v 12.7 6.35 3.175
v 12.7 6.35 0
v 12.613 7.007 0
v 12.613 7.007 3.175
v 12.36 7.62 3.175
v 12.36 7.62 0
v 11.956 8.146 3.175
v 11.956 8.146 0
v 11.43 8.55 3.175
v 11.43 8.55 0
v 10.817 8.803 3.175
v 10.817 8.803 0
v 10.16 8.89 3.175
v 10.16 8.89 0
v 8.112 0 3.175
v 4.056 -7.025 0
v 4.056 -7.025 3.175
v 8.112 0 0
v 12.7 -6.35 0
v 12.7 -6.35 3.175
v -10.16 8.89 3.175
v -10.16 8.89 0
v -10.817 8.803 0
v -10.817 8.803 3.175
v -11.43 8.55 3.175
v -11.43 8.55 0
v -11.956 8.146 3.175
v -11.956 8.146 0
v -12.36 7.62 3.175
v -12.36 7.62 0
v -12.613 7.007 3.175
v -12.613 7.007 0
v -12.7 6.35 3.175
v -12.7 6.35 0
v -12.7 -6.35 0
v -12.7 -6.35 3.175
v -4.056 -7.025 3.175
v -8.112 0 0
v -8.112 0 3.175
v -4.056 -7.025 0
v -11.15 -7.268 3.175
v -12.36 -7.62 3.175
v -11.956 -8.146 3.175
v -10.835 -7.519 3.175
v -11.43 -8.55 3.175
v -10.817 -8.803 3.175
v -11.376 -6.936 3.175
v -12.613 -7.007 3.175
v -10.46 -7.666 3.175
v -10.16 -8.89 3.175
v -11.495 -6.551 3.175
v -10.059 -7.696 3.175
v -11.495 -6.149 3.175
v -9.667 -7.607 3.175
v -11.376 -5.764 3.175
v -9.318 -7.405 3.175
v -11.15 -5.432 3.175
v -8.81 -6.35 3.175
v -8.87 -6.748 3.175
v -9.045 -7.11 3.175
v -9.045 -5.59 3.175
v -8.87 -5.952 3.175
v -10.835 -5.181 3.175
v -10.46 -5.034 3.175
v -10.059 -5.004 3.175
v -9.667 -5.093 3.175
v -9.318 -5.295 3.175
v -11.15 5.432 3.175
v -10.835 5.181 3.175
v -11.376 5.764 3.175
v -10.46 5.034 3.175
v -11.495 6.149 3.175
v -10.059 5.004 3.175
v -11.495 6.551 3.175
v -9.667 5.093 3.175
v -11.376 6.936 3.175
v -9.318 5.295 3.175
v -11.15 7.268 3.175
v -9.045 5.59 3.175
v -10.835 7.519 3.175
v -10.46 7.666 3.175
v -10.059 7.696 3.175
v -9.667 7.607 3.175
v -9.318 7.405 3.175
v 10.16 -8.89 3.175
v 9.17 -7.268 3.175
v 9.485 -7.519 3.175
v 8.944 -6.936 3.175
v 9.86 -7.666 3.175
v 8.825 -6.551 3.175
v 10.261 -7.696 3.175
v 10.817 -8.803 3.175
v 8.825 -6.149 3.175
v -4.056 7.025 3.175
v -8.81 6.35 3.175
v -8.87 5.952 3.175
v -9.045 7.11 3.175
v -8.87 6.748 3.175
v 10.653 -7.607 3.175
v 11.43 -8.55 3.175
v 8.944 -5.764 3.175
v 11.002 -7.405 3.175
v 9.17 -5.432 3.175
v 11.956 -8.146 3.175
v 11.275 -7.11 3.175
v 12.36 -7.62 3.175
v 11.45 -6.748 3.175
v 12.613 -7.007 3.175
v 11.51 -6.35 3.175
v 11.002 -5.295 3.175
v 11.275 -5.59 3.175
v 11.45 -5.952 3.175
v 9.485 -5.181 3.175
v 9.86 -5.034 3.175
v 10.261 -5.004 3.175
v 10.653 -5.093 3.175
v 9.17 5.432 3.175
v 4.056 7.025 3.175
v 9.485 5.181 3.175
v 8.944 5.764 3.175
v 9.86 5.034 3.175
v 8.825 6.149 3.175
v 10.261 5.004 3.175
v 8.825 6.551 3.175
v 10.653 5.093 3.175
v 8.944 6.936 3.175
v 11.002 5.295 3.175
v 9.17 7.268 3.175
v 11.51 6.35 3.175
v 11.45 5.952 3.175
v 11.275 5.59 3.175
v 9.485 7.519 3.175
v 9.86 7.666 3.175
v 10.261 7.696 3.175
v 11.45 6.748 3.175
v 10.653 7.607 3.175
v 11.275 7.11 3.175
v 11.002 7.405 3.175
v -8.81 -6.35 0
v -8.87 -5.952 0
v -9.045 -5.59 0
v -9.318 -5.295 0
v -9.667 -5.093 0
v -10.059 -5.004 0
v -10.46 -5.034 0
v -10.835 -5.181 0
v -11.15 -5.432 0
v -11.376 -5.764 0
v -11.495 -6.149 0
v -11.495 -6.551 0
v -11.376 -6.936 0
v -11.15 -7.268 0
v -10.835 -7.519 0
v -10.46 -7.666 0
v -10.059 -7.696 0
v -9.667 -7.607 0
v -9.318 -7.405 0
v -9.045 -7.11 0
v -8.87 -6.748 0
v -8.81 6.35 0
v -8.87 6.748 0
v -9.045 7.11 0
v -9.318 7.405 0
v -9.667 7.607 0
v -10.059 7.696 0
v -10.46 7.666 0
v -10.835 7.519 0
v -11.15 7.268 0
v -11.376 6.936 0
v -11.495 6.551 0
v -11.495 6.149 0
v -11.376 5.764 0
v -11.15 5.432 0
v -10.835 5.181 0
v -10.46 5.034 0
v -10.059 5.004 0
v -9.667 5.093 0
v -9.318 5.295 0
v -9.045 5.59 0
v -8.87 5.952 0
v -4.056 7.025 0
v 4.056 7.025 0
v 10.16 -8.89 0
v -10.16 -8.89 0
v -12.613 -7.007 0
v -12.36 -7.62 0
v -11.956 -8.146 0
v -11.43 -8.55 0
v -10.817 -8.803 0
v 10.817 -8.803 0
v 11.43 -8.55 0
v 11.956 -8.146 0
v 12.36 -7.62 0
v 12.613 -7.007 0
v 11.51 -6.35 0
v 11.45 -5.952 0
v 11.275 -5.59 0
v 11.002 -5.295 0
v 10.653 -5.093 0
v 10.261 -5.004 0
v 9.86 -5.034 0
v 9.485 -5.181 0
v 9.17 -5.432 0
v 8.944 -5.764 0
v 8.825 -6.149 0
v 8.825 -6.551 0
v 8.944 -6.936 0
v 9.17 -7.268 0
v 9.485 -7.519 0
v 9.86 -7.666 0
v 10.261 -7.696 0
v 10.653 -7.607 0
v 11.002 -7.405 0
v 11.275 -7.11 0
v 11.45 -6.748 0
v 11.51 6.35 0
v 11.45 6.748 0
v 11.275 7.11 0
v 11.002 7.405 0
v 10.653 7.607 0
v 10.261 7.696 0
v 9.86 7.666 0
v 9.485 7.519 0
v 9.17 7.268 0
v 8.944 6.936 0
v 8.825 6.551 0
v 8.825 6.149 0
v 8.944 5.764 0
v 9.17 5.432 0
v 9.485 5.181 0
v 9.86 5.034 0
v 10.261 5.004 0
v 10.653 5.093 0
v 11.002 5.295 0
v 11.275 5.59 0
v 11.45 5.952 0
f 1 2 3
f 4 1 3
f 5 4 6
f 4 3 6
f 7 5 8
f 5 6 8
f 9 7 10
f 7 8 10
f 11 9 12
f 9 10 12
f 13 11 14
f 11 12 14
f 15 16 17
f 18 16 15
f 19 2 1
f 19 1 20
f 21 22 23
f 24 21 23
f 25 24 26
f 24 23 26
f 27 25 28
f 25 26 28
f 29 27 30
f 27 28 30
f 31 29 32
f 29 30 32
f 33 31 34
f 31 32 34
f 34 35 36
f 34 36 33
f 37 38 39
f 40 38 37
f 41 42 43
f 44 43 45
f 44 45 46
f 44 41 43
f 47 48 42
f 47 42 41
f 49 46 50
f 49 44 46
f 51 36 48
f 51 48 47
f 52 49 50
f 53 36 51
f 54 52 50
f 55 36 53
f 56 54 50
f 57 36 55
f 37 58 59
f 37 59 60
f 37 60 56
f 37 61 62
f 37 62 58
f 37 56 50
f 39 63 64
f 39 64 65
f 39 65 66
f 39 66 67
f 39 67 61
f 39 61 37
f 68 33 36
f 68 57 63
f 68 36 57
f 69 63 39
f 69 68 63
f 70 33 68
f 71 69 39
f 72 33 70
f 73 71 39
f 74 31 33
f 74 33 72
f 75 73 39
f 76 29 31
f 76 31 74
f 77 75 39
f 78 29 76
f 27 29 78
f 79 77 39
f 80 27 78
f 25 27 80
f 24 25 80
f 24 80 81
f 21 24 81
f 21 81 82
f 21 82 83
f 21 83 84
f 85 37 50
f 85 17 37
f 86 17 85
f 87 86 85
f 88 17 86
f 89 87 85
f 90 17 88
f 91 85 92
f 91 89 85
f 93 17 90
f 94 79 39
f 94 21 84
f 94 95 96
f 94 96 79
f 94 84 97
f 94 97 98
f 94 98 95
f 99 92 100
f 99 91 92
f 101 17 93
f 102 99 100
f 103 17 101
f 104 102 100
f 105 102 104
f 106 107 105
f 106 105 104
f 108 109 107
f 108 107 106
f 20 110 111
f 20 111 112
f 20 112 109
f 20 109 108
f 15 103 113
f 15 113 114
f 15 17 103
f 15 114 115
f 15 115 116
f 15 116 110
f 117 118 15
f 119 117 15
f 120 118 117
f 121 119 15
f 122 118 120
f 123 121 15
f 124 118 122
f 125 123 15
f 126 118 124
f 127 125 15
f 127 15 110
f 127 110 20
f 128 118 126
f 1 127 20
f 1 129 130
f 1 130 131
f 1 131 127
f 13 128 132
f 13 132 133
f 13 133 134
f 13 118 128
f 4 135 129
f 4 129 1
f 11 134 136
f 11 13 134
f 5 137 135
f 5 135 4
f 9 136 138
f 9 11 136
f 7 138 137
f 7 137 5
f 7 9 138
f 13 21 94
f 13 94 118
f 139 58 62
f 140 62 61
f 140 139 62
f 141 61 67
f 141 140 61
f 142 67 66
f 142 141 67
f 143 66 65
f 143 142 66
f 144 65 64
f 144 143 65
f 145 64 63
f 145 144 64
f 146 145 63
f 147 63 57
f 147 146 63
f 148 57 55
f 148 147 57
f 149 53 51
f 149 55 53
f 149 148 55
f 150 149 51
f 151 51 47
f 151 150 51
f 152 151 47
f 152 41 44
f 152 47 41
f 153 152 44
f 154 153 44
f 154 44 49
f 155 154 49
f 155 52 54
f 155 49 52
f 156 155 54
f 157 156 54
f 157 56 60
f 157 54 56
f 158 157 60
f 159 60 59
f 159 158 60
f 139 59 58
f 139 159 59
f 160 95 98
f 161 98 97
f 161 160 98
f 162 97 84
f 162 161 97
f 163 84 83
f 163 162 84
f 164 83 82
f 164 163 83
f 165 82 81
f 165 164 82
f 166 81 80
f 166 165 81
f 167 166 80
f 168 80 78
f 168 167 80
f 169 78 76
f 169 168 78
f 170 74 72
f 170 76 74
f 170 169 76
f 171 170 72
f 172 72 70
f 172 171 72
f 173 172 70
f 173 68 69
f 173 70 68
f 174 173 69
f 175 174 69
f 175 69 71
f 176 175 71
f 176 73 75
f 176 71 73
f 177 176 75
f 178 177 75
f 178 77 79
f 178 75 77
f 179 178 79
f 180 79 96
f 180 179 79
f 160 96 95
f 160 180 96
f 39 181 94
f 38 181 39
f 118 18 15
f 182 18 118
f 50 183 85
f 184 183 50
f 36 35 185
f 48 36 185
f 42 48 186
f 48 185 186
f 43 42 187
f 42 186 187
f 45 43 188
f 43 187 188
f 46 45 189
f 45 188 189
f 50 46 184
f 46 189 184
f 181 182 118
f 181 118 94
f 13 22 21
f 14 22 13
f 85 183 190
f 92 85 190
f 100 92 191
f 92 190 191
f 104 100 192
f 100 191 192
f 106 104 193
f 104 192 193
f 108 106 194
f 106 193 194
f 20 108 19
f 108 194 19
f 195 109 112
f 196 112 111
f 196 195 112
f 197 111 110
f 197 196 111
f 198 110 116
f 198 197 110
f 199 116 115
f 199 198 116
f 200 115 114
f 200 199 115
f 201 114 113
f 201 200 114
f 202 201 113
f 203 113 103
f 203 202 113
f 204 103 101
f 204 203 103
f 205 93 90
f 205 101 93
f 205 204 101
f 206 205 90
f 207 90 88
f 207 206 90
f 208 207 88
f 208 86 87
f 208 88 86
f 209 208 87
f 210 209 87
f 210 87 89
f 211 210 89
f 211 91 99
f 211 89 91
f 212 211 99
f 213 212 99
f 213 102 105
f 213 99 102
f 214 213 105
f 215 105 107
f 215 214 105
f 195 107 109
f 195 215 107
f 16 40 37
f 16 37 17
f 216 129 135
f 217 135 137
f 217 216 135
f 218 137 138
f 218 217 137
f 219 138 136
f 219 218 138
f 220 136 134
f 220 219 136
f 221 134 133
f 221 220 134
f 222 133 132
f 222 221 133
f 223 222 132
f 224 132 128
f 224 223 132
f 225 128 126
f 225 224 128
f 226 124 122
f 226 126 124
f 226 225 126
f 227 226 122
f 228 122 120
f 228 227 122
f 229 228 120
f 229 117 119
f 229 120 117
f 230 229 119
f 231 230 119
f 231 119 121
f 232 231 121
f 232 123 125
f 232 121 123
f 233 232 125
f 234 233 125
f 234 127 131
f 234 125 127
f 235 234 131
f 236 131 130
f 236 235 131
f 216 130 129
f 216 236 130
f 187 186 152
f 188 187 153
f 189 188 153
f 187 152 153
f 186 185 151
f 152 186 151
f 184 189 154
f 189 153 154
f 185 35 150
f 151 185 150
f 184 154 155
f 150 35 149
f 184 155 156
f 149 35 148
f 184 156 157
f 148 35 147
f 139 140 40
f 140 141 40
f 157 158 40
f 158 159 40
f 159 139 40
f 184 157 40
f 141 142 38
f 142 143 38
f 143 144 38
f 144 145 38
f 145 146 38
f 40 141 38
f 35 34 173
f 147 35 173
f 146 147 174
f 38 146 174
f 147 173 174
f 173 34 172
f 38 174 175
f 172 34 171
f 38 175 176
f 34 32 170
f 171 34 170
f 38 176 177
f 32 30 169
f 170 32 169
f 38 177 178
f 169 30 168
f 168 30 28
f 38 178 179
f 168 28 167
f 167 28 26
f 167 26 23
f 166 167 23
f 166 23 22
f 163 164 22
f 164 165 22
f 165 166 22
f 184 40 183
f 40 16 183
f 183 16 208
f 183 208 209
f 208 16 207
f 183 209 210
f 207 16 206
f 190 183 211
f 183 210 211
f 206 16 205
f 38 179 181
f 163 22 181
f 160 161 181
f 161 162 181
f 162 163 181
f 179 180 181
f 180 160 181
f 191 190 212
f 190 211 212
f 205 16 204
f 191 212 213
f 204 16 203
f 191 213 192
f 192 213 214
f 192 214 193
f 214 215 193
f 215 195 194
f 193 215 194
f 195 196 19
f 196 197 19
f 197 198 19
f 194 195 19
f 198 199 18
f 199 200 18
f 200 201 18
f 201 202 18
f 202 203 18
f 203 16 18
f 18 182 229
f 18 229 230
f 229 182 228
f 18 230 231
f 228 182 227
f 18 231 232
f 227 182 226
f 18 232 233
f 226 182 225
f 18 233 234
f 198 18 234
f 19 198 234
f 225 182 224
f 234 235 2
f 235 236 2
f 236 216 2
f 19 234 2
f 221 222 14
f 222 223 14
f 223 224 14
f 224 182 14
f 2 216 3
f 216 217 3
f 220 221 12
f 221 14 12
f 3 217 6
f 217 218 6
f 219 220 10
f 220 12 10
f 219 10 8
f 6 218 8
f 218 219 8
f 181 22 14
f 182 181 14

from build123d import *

# Parameters (mm, degrees)
PAD_DEPTH       = 3.175
SKETCH001_R     = 1.35
POCKET_DEPTH    = 3.176
POCKET001_DEPTH = 3.176


with BuildPart() as part:
    # Sketch → Pad (new body)
    with BuildSketch(Plane.XY):
        with BuildLine():
            ThreePointArc((-10.16, 8.89), (-11.956051, 8.146051), (-12.7, 6.35))
            Line((-12.7, -6.35), (-12.7, 6.35))
            ThreePointArc((-12.7, -6.35), (-11.956051, -8.146051), (-10.16, -8.89))
            Line((10.16, -8.89), (-10.16, -8.89))
            ThreePointArc((10.16, -8.89), (11.956051, -8.146051), (12.7, -6.35))
            Line((12.7, 6.35), (12.7, -6.35))
            ThreePointArc((12.7, 6.35), (11.956051, 8.146051), (10.16, 8.89))
            Line((-10.16, 8.89), (10.16, 8.89))
        make_face()
    extrude(amount=PAD_DEPTH)

    # Sketch001 → Pocket (cut, through all)
    with BuildSketch(Plane.XY):
        with Locations((-10.16, 6.35)):
            Circle(SKETCH001_R)
        with Locations((-10.16, -6.35)):
            Circle(SKETCH001_R)
        with Locations((10.16, 6.35)):
            Circle(SKETCH001_R)
        with Locations((10.16, -6.35)):
            Circle(SKETCH001_R)
    extrude(amount=POCKET_DEPTH, mode=Mode.SUBTRACT)

    # Sketch002 → Pocket001 (cut, through all)
    with BuildSketch(Plane.XY):
        Polygon((4.055886, -7.025), (8.111771, 0), (4.055886, 7.025), (-4.055886, 7.025), (-8.111771, 0), (-4.055886, -7.025), align=None)
    extrude(amount=POCKET001_DEPTH, mode=Mode.SUBTRACT)


solid = part.part
